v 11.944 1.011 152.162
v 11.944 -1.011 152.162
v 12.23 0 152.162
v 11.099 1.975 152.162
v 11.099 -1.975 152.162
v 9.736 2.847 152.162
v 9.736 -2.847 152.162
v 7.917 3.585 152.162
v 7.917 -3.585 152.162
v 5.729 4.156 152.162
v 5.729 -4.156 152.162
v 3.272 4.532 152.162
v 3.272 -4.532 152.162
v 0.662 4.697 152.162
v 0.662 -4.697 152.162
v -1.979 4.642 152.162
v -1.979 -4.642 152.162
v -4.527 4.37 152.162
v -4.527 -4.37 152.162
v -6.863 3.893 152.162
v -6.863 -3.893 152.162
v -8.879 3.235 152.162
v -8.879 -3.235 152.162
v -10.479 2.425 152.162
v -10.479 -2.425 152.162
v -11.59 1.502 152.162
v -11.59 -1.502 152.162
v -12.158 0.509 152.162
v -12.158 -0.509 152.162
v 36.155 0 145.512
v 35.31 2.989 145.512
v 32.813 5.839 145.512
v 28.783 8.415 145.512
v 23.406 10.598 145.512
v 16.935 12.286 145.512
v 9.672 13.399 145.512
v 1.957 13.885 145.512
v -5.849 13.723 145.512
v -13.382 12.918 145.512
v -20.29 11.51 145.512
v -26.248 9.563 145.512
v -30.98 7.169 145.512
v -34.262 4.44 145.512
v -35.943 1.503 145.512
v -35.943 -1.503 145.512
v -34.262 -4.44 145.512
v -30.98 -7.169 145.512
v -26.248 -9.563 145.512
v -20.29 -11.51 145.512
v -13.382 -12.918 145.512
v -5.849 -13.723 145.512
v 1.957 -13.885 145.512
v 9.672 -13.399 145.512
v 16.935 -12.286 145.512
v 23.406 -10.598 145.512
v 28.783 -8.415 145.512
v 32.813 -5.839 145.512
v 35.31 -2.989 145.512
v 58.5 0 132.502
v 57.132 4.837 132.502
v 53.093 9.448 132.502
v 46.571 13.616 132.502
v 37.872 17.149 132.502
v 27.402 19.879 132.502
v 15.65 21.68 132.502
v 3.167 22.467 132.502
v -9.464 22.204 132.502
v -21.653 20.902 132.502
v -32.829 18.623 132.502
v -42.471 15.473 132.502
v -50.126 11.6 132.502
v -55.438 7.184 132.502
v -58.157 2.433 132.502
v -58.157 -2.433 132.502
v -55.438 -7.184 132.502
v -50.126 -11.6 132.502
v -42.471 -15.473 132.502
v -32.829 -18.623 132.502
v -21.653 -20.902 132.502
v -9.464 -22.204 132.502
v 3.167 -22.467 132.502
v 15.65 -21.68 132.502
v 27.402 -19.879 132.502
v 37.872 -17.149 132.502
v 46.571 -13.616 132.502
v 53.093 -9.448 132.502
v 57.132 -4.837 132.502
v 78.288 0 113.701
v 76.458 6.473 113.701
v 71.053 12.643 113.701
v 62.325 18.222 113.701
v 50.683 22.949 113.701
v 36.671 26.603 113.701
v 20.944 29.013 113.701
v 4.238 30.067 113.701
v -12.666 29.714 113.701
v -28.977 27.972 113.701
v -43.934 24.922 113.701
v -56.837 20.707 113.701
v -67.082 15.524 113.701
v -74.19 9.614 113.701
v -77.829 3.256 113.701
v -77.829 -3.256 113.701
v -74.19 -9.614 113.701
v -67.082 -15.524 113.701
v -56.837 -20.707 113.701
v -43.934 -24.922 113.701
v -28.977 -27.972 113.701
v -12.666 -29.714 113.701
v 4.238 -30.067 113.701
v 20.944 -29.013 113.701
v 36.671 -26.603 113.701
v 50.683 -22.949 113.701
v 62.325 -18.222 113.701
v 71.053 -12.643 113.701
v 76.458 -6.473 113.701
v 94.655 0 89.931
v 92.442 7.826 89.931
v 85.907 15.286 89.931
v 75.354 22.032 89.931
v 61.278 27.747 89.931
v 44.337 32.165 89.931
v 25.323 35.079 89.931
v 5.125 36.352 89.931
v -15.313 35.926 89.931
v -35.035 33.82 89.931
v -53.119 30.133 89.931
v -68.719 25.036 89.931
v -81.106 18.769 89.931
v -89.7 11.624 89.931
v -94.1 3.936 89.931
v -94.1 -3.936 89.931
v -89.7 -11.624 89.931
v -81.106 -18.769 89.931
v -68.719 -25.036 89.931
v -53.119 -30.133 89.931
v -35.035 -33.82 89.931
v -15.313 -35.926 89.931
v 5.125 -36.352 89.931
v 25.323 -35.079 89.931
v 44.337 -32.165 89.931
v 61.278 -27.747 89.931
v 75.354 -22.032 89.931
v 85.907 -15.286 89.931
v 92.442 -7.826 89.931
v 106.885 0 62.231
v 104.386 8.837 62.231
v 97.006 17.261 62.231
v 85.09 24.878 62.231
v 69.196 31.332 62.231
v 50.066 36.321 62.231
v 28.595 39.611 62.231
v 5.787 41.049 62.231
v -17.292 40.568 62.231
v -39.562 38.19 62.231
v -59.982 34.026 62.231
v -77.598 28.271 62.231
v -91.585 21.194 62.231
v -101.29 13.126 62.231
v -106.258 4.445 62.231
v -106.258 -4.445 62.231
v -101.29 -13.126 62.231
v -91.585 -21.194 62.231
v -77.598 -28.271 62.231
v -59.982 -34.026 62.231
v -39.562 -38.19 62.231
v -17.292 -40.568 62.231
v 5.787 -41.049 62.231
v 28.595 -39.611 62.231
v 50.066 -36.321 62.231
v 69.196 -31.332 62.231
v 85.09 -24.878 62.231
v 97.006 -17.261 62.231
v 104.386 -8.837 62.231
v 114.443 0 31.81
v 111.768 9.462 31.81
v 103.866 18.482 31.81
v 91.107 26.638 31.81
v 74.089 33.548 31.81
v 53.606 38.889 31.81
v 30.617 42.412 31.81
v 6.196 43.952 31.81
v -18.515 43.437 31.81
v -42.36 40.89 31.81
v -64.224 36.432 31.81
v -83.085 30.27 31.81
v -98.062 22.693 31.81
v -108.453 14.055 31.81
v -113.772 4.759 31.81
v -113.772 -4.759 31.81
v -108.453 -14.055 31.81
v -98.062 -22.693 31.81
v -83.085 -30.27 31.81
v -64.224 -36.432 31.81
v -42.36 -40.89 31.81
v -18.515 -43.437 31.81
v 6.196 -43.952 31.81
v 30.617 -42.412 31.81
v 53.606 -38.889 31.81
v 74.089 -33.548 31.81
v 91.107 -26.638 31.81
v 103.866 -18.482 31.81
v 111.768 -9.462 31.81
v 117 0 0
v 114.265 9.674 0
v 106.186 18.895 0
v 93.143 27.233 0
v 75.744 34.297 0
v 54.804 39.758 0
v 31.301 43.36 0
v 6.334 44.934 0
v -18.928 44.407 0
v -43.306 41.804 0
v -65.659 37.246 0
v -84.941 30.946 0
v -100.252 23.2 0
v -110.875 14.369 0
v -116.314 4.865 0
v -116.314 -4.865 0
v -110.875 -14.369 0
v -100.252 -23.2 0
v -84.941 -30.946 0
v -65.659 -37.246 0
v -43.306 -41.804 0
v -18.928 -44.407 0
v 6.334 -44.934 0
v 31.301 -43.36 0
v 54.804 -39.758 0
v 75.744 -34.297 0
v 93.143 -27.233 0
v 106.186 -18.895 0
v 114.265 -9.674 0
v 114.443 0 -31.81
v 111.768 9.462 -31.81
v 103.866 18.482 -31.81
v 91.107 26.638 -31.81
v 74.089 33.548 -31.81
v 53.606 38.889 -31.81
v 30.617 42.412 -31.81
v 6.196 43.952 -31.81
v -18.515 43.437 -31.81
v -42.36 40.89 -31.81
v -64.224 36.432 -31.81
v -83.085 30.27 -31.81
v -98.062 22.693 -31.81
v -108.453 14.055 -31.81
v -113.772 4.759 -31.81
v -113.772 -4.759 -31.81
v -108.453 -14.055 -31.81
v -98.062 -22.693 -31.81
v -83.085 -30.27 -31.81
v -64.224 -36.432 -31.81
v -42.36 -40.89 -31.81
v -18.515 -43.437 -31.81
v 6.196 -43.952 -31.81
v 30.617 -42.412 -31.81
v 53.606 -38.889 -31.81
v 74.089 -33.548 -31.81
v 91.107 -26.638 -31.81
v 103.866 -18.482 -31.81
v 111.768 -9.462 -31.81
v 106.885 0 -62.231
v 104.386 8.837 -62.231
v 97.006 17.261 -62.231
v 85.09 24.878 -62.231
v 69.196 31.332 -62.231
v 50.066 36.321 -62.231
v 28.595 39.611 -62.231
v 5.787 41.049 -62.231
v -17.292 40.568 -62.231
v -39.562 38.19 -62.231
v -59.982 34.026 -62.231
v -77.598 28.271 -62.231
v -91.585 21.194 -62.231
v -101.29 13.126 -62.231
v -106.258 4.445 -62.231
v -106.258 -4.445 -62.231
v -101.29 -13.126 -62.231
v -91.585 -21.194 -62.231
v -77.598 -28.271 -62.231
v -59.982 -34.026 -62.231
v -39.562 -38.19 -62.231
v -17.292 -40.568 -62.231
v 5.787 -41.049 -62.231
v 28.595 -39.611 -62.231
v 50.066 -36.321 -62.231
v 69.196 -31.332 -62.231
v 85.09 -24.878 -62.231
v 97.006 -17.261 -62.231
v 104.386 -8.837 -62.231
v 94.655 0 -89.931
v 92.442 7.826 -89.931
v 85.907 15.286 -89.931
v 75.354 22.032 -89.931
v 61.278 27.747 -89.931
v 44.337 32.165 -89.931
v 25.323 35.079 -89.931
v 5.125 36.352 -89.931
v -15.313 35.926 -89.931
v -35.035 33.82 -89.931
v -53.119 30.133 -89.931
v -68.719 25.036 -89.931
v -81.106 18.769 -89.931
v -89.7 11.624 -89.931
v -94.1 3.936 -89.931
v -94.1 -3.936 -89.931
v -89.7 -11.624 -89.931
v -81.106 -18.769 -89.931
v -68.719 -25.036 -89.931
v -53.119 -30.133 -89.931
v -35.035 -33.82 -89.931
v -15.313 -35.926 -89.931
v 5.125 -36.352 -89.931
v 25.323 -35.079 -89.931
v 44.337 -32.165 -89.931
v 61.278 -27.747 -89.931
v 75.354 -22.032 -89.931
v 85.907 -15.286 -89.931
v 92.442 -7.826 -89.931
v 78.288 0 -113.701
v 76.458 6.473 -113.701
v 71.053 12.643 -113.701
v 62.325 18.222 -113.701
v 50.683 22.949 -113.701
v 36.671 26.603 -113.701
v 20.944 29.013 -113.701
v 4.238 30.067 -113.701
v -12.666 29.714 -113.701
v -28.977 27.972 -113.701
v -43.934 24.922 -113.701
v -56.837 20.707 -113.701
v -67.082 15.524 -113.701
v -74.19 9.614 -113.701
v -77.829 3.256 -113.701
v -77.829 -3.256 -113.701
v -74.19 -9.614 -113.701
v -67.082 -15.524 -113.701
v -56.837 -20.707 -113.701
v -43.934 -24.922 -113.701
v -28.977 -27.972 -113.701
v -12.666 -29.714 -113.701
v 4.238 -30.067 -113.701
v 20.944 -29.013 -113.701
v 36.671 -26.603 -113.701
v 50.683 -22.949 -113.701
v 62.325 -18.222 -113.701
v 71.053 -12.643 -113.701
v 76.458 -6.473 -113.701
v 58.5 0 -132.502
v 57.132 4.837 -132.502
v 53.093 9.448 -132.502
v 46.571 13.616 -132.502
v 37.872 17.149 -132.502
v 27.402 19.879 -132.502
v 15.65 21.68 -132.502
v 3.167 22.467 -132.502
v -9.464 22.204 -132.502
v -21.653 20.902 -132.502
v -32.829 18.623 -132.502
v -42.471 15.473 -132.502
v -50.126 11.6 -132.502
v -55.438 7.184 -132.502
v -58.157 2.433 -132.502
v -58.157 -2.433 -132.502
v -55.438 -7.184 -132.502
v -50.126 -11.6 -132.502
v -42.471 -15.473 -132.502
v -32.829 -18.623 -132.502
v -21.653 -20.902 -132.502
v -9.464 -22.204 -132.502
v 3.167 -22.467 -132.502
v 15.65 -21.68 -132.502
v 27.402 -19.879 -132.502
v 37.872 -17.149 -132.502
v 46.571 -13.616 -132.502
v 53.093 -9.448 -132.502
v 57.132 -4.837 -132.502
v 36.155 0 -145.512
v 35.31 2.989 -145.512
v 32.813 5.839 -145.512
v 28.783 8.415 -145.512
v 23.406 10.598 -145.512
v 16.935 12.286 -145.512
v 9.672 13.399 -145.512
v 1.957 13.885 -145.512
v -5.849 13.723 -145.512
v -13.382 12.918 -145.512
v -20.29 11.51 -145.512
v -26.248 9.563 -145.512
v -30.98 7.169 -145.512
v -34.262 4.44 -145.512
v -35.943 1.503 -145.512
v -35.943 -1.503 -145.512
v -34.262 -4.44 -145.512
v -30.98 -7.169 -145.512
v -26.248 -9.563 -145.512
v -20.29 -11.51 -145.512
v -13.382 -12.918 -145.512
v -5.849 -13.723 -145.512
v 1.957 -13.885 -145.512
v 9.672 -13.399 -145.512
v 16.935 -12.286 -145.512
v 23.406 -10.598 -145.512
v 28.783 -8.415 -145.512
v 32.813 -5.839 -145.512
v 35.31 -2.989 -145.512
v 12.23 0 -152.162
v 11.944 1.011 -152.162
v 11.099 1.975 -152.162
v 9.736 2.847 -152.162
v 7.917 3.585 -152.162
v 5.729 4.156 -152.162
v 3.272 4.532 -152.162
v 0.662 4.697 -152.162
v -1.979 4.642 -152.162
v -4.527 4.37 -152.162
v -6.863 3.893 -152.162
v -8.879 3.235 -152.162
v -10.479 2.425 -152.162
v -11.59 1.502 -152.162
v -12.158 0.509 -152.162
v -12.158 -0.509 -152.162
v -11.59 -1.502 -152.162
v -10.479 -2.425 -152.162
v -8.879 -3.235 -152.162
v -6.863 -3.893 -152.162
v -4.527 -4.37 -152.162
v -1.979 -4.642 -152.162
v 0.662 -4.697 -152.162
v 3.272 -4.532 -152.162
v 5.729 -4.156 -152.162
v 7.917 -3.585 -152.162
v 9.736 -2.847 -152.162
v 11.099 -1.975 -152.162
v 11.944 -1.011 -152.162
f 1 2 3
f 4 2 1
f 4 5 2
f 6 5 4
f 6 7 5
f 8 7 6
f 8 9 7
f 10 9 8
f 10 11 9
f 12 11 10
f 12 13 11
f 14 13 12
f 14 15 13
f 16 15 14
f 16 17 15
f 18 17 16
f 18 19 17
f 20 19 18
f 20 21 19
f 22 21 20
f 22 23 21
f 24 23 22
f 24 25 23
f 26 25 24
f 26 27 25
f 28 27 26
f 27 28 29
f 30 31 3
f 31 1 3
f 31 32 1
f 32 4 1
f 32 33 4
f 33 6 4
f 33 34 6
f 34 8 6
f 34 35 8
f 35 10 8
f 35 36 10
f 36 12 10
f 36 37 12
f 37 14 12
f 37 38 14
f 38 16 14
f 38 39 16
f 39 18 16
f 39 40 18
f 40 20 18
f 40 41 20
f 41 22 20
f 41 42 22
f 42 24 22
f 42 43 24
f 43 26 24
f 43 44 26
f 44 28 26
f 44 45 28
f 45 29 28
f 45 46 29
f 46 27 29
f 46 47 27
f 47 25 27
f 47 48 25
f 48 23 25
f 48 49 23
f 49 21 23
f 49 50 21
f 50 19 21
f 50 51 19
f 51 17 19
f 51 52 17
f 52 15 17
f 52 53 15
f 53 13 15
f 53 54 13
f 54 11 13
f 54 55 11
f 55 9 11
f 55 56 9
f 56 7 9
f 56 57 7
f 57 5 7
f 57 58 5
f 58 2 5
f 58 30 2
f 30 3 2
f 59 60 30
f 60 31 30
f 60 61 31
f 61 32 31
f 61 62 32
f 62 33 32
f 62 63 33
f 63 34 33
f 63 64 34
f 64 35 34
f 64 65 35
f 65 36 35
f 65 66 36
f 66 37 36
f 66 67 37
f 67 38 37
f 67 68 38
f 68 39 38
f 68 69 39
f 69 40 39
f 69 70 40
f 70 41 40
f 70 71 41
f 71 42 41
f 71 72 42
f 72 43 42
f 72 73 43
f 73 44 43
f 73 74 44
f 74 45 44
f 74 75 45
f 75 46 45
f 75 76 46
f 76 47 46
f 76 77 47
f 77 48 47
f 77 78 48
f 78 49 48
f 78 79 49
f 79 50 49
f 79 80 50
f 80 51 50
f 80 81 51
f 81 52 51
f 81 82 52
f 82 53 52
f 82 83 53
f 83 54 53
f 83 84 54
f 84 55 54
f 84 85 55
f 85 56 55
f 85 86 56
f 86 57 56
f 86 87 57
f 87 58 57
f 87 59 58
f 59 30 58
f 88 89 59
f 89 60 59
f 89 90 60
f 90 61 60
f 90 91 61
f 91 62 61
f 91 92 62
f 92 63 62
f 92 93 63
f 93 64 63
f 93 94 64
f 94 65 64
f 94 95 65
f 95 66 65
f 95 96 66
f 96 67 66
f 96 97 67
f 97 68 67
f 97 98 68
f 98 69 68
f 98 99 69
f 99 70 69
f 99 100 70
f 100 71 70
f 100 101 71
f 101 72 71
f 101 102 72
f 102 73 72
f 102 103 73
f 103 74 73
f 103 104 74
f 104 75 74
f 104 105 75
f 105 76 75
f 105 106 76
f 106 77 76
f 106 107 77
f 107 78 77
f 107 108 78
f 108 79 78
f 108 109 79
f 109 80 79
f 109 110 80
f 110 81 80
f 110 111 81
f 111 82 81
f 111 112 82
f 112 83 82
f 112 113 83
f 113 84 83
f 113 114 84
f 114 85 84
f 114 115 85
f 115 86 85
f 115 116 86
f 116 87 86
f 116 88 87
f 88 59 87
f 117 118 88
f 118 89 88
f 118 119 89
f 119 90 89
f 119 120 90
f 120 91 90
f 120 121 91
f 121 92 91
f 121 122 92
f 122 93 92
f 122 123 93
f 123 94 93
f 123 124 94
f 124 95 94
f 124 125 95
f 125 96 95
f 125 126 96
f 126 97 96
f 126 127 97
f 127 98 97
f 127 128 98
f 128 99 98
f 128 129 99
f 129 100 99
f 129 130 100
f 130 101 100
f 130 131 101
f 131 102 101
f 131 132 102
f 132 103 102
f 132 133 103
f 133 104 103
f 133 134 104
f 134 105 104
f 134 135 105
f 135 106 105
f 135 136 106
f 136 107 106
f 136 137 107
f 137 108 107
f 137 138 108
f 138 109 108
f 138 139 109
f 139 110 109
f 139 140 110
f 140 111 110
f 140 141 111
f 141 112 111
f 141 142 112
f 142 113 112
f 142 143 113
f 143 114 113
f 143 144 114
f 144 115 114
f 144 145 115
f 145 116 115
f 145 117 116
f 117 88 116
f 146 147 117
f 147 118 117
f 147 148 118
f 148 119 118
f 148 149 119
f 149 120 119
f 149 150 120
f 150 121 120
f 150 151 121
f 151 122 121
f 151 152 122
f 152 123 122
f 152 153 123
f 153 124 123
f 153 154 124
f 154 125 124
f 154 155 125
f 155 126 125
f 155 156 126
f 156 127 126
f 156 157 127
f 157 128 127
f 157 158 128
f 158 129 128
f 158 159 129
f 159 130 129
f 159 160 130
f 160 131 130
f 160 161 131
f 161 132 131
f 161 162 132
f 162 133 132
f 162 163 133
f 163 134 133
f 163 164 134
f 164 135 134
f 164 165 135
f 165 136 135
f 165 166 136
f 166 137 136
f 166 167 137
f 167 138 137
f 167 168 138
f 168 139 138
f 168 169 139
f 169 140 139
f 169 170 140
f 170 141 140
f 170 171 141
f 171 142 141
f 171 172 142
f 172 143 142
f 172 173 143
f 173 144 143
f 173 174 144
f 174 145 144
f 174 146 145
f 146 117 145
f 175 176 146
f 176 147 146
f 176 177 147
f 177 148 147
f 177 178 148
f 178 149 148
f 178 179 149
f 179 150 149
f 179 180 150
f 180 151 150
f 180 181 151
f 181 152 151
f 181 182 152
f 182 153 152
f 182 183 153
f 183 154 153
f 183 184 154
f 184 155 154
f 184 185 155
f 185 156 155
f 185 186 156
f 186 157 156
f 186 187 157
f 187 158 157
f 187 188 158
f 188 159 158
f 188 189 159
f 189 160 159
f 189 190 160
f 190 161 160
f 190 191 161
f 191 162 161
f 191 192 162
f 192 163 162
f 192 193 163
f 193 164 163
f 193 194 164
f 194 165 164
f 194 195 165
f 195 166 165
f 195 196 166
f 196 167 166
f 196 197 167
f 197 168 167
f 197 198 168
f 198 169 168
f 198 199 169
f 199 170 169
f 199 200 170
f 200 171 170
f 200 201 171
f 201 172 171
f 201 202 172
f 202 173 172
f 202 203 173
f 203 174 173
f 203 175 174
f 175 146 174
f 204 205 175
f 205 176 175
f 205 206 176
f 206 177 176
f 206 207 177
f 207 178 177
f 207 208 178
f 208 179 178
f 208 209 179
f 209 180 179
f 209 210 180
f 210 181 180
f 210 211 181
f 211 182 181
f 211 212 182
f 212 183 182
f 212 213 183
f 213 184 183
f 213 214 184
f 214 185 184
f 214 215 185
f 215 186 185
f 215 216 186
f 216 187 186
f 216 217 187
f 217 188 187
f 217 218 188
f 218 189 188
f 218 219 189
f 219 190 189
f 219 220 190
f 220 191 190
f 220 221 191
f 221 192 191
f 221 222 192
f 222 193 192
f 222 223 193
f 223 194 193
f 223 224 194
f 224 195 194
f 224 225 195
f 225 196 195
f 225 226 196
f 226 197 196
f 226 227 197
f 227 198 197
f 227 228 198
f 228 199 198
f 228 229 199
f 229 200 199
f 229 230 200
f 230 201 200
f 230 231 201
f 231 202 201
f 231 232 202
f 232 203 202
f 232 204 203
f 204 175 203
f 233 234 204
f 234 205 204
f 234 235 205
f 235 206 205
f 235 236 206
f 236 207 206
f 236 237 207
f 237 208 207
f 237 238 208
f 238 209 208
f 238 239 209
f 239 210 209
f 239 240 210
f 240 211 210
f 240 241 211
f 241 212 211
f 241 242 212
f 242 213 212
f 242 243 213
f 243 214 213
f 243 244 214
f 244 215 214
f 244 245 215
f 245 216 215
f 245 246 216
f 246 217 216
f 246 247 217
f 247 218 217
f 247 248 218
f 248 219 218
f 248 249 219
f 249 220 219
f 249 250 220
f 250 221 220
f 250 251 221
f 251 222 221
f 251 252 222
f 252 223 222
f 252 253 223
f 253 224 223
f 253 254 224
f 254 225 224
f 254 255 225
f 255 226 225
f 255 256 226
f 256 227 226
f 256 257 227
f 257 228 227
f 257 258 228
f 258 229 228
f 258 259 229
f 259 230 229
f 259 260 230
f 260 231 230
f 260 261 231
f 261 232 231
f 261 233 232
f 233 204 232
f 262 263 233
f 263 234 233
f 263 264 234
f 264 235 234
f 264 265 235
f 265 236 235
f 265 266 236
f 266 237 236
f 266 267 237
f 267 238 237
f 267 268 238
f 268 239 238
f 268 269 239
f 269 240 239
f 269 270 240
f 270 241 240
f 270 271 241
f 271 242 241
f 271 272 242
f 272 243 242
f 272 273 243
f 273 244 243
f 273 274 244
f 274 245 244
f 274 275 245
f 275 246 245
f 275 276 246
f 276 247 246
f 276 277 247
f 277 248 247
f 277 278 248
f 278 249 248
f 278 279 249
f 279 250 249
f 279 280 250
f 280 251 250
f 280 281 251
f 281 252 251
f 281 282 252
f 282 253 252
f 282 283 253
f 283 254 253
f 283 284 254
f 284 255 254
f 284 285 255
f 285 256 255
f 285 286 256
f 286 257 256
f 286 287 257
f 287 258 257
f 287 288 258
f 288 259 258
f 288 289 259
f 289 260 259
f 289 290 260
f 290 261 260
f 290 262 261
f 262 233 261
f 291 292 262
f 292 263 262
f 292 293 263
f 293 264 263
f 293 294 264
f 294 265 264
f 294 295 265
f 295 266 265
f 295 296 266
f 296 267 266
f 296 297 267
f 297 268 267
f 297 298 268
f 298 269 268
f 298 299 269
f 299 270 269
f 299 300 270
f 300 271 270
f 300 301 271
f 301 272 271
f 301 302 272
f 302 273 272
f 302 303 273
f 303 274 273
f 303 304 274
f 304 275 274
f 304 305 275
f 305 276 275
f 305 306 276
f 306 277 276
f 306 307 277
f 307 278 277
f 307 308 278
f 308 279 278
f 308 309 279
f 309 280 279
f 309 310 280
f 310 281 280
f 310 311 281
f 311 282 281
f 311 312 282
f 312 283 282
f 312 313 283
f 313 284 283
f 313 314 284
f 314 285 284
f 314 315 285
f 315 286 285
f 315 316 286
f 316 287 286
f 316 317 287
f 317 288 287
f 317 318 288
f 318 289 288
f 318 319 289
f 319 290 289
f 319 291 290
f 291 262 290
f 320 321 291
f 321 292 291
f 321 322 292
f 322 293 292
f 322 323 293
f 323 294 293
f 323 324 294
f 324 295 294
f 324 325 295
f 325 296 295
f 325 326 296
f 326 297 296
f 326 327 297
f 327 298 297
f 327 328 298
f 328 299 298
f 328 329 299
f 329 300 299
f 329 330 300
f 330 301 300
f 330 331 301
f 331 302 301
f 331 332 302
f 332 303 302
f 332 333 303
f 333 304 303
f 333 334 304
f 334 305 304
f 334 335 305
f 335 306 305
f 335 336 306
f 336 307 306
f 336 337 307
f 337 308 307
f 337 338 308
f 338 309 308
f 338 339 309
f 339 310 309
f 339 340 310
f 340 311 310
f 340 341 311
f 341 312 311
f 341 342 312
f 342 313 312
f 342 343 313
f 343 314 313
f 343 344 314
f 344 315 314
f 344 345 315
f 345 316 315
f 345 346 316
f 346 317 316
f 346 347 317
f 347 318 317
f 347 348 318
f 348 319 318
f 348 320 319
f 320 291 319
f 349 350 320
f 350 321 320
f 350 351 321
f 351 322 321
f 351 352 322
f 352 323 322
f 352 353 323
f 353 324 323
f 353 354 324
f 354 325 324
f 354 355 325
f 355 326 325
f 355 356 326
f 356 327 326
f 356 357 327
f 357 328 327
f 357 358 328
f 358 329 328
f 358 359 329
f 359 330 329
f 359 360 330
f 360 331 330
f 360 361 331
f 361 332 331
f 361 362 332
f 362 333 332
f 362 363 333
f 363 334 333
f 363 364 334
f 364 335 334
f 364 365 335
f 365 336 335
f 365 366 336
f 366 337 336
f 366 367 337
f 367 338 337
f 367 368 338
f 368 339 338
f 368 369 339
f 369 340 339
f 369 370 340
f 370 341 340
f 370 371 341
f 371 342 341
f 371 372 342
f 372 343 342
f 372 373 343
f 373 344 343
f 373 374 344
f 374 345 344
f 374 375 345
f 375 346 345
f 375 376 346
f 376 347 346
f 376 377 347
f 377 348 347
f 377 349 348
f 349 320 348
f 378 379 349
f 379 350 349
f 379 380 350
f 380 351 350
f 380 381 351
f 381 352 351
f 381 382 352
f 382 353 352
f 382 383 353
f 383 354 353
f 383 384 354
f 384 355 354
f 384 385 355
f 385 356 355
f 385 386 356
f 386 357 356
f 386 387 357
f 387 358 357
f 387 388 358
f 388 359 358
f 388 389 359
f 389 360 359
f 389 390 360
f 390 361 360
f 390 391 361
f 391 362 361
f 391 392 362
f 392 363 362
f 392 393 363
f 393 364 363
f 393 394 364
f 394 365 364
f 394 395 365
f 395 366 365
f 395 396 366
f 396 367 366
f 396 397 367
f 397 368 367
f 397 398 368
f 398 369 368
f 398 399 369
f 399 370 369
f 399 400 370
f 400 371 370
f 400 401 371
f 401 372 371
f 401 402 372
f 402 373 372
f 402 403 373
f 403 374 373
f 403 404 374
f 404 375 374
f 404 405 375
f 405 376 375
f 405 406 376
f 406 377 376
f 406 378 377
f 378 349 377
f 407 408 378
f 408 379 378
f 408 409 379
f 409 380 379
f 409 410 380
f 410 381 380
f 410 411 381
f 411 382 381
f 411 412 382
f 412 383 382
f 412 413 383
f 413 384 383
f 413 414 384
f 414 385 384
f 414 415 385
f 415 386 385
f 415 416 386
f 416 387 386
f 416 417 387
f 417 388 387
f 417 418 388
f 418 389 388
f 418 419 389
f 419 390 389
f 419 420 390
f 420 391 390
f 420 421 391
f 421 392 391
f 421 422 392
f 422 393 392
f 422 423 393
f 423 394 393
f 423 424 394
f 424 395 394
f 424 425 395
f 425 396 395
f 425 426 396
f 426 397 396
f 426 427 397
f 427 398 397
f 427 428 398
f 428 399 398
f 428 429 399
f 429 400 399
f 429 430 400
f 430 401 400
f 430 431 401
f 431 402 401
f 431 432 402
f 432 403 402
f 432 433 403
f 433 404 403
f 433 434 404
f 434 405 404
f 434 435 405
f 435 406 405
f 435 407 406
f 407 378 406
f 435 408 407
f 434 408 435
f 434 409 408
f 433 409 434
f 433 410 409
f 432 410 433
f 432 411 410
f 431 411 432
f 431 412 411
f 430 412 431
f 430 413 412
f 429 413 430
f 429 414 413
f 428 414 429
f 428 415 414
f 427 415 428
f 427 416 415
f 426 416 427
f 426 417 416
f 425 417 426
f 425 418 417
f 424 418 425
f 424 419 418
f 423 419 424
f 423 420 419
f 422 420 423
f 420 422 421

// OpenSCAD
// Generated by SolidPython 1.0.1 on 2020-07-29 00:46:50


scale(v = [13, 5, 17]) {
	sphere(r = 9);
}
/***********************************************
*********      SolidPython code:      **********
************************************************
 
# import packages: SolidPython
from solid import *
from solid.utils import *
from itertools import chain, combinations, permutations


class Resize:

    def __init__(self, scad_file):
        self.scad_file = scad_file
        #self.scad_file = import_scad(scad_file)
        # cone/cylinder param:
        self.r1 = 0
        self.r2 = 0
        self.h = 0
        # rectangular prism param:
        self.w = 0
        self.l = 0
        # ellipse param:
        self.r = 0

    # import OpenScad code (file name corresponds to shape)


    # classify shape + parameters
    def assign(self, param1, param2, param3):
        if self.scad_file == 'cone.scad':
            self.r1 = param1
            self.r2 = param2
            self.h = param3
        elif self.scad_file == 'cylinder.scad':
            self.r1 = param1
            self.r2 = param2
            self.h = param3
        elif self.scad_file == 'rectangularPrism.scad':
            self.h = param1
            self.l = param2
            self.w = param3
        else:
            self.r = param1
            self.h = param2

    # resize parameters
    def iterate(self):
        x = range(3, 20, 2)
        i = 1
        if self.scad_file == 'cone.scad':
            tempList = list(permutations(x, 2))
            for temp in tempList:
                param1 = temp[0]
                param2 = temp[1]
                filepath = 'produced_scad_files/' + 'cone' + str(param1) + '_' + str(param2) + '_' + '.scad'
                scad_render_to_file(cylinder(h=param1, r1=param2, r2=0), filepath)

        elif self.scad_file == 'cylinder.scad':
            tempList = list(permutations(x, 3))
            for temp in tempList:
                param1 = temp[0]
                param2 = temp[1]
                filepath = 'produced_scad_files/' + 'cylinder' + str(param1) + '_' + str(param2) + '_' + '.scad'
                scad_render_to_file(cylinder(h=param1, r1=param2, r2=param2), filepath)

        elif self.scad_file == 'rectangularPrism.scad':
            tempList = list(permutations(x, 3))
            for temp in tempList:
                param1 = temp[0]
                param2 = temp[1]
                param3 = temp[2]
                filepath = 'produced_scad_files/' + 'rectangularPrism' + str(param1) + '_' + str(param2) + '_' + str(
                    param3) + '.scad'
                scad_render_to_file(cube(size=(param1, param2, param3)), filepath)

        elif self.scad_file == 'ellipse.scad':
            tempList = list(permutations(x, 4))
            for temp in tempList:
                param1 = temp[0]
                param2 = temp[1]
                param3 = temp[2]
                param4 = temp[3]
                filepath = 'produced_scad_files/' + 'ellipse' + str(param1) + '_' + str(param2) + '_' + str(param3) + '_' + str(param4) + '.scad'
                scad_render_to_file(scale([param1, param2, param3])(sphere(r=param4)), filepath)

    def render_to_scadfile(self):
        scad_render_to_file(scad, 'example.scad') 
 
************************************************/
